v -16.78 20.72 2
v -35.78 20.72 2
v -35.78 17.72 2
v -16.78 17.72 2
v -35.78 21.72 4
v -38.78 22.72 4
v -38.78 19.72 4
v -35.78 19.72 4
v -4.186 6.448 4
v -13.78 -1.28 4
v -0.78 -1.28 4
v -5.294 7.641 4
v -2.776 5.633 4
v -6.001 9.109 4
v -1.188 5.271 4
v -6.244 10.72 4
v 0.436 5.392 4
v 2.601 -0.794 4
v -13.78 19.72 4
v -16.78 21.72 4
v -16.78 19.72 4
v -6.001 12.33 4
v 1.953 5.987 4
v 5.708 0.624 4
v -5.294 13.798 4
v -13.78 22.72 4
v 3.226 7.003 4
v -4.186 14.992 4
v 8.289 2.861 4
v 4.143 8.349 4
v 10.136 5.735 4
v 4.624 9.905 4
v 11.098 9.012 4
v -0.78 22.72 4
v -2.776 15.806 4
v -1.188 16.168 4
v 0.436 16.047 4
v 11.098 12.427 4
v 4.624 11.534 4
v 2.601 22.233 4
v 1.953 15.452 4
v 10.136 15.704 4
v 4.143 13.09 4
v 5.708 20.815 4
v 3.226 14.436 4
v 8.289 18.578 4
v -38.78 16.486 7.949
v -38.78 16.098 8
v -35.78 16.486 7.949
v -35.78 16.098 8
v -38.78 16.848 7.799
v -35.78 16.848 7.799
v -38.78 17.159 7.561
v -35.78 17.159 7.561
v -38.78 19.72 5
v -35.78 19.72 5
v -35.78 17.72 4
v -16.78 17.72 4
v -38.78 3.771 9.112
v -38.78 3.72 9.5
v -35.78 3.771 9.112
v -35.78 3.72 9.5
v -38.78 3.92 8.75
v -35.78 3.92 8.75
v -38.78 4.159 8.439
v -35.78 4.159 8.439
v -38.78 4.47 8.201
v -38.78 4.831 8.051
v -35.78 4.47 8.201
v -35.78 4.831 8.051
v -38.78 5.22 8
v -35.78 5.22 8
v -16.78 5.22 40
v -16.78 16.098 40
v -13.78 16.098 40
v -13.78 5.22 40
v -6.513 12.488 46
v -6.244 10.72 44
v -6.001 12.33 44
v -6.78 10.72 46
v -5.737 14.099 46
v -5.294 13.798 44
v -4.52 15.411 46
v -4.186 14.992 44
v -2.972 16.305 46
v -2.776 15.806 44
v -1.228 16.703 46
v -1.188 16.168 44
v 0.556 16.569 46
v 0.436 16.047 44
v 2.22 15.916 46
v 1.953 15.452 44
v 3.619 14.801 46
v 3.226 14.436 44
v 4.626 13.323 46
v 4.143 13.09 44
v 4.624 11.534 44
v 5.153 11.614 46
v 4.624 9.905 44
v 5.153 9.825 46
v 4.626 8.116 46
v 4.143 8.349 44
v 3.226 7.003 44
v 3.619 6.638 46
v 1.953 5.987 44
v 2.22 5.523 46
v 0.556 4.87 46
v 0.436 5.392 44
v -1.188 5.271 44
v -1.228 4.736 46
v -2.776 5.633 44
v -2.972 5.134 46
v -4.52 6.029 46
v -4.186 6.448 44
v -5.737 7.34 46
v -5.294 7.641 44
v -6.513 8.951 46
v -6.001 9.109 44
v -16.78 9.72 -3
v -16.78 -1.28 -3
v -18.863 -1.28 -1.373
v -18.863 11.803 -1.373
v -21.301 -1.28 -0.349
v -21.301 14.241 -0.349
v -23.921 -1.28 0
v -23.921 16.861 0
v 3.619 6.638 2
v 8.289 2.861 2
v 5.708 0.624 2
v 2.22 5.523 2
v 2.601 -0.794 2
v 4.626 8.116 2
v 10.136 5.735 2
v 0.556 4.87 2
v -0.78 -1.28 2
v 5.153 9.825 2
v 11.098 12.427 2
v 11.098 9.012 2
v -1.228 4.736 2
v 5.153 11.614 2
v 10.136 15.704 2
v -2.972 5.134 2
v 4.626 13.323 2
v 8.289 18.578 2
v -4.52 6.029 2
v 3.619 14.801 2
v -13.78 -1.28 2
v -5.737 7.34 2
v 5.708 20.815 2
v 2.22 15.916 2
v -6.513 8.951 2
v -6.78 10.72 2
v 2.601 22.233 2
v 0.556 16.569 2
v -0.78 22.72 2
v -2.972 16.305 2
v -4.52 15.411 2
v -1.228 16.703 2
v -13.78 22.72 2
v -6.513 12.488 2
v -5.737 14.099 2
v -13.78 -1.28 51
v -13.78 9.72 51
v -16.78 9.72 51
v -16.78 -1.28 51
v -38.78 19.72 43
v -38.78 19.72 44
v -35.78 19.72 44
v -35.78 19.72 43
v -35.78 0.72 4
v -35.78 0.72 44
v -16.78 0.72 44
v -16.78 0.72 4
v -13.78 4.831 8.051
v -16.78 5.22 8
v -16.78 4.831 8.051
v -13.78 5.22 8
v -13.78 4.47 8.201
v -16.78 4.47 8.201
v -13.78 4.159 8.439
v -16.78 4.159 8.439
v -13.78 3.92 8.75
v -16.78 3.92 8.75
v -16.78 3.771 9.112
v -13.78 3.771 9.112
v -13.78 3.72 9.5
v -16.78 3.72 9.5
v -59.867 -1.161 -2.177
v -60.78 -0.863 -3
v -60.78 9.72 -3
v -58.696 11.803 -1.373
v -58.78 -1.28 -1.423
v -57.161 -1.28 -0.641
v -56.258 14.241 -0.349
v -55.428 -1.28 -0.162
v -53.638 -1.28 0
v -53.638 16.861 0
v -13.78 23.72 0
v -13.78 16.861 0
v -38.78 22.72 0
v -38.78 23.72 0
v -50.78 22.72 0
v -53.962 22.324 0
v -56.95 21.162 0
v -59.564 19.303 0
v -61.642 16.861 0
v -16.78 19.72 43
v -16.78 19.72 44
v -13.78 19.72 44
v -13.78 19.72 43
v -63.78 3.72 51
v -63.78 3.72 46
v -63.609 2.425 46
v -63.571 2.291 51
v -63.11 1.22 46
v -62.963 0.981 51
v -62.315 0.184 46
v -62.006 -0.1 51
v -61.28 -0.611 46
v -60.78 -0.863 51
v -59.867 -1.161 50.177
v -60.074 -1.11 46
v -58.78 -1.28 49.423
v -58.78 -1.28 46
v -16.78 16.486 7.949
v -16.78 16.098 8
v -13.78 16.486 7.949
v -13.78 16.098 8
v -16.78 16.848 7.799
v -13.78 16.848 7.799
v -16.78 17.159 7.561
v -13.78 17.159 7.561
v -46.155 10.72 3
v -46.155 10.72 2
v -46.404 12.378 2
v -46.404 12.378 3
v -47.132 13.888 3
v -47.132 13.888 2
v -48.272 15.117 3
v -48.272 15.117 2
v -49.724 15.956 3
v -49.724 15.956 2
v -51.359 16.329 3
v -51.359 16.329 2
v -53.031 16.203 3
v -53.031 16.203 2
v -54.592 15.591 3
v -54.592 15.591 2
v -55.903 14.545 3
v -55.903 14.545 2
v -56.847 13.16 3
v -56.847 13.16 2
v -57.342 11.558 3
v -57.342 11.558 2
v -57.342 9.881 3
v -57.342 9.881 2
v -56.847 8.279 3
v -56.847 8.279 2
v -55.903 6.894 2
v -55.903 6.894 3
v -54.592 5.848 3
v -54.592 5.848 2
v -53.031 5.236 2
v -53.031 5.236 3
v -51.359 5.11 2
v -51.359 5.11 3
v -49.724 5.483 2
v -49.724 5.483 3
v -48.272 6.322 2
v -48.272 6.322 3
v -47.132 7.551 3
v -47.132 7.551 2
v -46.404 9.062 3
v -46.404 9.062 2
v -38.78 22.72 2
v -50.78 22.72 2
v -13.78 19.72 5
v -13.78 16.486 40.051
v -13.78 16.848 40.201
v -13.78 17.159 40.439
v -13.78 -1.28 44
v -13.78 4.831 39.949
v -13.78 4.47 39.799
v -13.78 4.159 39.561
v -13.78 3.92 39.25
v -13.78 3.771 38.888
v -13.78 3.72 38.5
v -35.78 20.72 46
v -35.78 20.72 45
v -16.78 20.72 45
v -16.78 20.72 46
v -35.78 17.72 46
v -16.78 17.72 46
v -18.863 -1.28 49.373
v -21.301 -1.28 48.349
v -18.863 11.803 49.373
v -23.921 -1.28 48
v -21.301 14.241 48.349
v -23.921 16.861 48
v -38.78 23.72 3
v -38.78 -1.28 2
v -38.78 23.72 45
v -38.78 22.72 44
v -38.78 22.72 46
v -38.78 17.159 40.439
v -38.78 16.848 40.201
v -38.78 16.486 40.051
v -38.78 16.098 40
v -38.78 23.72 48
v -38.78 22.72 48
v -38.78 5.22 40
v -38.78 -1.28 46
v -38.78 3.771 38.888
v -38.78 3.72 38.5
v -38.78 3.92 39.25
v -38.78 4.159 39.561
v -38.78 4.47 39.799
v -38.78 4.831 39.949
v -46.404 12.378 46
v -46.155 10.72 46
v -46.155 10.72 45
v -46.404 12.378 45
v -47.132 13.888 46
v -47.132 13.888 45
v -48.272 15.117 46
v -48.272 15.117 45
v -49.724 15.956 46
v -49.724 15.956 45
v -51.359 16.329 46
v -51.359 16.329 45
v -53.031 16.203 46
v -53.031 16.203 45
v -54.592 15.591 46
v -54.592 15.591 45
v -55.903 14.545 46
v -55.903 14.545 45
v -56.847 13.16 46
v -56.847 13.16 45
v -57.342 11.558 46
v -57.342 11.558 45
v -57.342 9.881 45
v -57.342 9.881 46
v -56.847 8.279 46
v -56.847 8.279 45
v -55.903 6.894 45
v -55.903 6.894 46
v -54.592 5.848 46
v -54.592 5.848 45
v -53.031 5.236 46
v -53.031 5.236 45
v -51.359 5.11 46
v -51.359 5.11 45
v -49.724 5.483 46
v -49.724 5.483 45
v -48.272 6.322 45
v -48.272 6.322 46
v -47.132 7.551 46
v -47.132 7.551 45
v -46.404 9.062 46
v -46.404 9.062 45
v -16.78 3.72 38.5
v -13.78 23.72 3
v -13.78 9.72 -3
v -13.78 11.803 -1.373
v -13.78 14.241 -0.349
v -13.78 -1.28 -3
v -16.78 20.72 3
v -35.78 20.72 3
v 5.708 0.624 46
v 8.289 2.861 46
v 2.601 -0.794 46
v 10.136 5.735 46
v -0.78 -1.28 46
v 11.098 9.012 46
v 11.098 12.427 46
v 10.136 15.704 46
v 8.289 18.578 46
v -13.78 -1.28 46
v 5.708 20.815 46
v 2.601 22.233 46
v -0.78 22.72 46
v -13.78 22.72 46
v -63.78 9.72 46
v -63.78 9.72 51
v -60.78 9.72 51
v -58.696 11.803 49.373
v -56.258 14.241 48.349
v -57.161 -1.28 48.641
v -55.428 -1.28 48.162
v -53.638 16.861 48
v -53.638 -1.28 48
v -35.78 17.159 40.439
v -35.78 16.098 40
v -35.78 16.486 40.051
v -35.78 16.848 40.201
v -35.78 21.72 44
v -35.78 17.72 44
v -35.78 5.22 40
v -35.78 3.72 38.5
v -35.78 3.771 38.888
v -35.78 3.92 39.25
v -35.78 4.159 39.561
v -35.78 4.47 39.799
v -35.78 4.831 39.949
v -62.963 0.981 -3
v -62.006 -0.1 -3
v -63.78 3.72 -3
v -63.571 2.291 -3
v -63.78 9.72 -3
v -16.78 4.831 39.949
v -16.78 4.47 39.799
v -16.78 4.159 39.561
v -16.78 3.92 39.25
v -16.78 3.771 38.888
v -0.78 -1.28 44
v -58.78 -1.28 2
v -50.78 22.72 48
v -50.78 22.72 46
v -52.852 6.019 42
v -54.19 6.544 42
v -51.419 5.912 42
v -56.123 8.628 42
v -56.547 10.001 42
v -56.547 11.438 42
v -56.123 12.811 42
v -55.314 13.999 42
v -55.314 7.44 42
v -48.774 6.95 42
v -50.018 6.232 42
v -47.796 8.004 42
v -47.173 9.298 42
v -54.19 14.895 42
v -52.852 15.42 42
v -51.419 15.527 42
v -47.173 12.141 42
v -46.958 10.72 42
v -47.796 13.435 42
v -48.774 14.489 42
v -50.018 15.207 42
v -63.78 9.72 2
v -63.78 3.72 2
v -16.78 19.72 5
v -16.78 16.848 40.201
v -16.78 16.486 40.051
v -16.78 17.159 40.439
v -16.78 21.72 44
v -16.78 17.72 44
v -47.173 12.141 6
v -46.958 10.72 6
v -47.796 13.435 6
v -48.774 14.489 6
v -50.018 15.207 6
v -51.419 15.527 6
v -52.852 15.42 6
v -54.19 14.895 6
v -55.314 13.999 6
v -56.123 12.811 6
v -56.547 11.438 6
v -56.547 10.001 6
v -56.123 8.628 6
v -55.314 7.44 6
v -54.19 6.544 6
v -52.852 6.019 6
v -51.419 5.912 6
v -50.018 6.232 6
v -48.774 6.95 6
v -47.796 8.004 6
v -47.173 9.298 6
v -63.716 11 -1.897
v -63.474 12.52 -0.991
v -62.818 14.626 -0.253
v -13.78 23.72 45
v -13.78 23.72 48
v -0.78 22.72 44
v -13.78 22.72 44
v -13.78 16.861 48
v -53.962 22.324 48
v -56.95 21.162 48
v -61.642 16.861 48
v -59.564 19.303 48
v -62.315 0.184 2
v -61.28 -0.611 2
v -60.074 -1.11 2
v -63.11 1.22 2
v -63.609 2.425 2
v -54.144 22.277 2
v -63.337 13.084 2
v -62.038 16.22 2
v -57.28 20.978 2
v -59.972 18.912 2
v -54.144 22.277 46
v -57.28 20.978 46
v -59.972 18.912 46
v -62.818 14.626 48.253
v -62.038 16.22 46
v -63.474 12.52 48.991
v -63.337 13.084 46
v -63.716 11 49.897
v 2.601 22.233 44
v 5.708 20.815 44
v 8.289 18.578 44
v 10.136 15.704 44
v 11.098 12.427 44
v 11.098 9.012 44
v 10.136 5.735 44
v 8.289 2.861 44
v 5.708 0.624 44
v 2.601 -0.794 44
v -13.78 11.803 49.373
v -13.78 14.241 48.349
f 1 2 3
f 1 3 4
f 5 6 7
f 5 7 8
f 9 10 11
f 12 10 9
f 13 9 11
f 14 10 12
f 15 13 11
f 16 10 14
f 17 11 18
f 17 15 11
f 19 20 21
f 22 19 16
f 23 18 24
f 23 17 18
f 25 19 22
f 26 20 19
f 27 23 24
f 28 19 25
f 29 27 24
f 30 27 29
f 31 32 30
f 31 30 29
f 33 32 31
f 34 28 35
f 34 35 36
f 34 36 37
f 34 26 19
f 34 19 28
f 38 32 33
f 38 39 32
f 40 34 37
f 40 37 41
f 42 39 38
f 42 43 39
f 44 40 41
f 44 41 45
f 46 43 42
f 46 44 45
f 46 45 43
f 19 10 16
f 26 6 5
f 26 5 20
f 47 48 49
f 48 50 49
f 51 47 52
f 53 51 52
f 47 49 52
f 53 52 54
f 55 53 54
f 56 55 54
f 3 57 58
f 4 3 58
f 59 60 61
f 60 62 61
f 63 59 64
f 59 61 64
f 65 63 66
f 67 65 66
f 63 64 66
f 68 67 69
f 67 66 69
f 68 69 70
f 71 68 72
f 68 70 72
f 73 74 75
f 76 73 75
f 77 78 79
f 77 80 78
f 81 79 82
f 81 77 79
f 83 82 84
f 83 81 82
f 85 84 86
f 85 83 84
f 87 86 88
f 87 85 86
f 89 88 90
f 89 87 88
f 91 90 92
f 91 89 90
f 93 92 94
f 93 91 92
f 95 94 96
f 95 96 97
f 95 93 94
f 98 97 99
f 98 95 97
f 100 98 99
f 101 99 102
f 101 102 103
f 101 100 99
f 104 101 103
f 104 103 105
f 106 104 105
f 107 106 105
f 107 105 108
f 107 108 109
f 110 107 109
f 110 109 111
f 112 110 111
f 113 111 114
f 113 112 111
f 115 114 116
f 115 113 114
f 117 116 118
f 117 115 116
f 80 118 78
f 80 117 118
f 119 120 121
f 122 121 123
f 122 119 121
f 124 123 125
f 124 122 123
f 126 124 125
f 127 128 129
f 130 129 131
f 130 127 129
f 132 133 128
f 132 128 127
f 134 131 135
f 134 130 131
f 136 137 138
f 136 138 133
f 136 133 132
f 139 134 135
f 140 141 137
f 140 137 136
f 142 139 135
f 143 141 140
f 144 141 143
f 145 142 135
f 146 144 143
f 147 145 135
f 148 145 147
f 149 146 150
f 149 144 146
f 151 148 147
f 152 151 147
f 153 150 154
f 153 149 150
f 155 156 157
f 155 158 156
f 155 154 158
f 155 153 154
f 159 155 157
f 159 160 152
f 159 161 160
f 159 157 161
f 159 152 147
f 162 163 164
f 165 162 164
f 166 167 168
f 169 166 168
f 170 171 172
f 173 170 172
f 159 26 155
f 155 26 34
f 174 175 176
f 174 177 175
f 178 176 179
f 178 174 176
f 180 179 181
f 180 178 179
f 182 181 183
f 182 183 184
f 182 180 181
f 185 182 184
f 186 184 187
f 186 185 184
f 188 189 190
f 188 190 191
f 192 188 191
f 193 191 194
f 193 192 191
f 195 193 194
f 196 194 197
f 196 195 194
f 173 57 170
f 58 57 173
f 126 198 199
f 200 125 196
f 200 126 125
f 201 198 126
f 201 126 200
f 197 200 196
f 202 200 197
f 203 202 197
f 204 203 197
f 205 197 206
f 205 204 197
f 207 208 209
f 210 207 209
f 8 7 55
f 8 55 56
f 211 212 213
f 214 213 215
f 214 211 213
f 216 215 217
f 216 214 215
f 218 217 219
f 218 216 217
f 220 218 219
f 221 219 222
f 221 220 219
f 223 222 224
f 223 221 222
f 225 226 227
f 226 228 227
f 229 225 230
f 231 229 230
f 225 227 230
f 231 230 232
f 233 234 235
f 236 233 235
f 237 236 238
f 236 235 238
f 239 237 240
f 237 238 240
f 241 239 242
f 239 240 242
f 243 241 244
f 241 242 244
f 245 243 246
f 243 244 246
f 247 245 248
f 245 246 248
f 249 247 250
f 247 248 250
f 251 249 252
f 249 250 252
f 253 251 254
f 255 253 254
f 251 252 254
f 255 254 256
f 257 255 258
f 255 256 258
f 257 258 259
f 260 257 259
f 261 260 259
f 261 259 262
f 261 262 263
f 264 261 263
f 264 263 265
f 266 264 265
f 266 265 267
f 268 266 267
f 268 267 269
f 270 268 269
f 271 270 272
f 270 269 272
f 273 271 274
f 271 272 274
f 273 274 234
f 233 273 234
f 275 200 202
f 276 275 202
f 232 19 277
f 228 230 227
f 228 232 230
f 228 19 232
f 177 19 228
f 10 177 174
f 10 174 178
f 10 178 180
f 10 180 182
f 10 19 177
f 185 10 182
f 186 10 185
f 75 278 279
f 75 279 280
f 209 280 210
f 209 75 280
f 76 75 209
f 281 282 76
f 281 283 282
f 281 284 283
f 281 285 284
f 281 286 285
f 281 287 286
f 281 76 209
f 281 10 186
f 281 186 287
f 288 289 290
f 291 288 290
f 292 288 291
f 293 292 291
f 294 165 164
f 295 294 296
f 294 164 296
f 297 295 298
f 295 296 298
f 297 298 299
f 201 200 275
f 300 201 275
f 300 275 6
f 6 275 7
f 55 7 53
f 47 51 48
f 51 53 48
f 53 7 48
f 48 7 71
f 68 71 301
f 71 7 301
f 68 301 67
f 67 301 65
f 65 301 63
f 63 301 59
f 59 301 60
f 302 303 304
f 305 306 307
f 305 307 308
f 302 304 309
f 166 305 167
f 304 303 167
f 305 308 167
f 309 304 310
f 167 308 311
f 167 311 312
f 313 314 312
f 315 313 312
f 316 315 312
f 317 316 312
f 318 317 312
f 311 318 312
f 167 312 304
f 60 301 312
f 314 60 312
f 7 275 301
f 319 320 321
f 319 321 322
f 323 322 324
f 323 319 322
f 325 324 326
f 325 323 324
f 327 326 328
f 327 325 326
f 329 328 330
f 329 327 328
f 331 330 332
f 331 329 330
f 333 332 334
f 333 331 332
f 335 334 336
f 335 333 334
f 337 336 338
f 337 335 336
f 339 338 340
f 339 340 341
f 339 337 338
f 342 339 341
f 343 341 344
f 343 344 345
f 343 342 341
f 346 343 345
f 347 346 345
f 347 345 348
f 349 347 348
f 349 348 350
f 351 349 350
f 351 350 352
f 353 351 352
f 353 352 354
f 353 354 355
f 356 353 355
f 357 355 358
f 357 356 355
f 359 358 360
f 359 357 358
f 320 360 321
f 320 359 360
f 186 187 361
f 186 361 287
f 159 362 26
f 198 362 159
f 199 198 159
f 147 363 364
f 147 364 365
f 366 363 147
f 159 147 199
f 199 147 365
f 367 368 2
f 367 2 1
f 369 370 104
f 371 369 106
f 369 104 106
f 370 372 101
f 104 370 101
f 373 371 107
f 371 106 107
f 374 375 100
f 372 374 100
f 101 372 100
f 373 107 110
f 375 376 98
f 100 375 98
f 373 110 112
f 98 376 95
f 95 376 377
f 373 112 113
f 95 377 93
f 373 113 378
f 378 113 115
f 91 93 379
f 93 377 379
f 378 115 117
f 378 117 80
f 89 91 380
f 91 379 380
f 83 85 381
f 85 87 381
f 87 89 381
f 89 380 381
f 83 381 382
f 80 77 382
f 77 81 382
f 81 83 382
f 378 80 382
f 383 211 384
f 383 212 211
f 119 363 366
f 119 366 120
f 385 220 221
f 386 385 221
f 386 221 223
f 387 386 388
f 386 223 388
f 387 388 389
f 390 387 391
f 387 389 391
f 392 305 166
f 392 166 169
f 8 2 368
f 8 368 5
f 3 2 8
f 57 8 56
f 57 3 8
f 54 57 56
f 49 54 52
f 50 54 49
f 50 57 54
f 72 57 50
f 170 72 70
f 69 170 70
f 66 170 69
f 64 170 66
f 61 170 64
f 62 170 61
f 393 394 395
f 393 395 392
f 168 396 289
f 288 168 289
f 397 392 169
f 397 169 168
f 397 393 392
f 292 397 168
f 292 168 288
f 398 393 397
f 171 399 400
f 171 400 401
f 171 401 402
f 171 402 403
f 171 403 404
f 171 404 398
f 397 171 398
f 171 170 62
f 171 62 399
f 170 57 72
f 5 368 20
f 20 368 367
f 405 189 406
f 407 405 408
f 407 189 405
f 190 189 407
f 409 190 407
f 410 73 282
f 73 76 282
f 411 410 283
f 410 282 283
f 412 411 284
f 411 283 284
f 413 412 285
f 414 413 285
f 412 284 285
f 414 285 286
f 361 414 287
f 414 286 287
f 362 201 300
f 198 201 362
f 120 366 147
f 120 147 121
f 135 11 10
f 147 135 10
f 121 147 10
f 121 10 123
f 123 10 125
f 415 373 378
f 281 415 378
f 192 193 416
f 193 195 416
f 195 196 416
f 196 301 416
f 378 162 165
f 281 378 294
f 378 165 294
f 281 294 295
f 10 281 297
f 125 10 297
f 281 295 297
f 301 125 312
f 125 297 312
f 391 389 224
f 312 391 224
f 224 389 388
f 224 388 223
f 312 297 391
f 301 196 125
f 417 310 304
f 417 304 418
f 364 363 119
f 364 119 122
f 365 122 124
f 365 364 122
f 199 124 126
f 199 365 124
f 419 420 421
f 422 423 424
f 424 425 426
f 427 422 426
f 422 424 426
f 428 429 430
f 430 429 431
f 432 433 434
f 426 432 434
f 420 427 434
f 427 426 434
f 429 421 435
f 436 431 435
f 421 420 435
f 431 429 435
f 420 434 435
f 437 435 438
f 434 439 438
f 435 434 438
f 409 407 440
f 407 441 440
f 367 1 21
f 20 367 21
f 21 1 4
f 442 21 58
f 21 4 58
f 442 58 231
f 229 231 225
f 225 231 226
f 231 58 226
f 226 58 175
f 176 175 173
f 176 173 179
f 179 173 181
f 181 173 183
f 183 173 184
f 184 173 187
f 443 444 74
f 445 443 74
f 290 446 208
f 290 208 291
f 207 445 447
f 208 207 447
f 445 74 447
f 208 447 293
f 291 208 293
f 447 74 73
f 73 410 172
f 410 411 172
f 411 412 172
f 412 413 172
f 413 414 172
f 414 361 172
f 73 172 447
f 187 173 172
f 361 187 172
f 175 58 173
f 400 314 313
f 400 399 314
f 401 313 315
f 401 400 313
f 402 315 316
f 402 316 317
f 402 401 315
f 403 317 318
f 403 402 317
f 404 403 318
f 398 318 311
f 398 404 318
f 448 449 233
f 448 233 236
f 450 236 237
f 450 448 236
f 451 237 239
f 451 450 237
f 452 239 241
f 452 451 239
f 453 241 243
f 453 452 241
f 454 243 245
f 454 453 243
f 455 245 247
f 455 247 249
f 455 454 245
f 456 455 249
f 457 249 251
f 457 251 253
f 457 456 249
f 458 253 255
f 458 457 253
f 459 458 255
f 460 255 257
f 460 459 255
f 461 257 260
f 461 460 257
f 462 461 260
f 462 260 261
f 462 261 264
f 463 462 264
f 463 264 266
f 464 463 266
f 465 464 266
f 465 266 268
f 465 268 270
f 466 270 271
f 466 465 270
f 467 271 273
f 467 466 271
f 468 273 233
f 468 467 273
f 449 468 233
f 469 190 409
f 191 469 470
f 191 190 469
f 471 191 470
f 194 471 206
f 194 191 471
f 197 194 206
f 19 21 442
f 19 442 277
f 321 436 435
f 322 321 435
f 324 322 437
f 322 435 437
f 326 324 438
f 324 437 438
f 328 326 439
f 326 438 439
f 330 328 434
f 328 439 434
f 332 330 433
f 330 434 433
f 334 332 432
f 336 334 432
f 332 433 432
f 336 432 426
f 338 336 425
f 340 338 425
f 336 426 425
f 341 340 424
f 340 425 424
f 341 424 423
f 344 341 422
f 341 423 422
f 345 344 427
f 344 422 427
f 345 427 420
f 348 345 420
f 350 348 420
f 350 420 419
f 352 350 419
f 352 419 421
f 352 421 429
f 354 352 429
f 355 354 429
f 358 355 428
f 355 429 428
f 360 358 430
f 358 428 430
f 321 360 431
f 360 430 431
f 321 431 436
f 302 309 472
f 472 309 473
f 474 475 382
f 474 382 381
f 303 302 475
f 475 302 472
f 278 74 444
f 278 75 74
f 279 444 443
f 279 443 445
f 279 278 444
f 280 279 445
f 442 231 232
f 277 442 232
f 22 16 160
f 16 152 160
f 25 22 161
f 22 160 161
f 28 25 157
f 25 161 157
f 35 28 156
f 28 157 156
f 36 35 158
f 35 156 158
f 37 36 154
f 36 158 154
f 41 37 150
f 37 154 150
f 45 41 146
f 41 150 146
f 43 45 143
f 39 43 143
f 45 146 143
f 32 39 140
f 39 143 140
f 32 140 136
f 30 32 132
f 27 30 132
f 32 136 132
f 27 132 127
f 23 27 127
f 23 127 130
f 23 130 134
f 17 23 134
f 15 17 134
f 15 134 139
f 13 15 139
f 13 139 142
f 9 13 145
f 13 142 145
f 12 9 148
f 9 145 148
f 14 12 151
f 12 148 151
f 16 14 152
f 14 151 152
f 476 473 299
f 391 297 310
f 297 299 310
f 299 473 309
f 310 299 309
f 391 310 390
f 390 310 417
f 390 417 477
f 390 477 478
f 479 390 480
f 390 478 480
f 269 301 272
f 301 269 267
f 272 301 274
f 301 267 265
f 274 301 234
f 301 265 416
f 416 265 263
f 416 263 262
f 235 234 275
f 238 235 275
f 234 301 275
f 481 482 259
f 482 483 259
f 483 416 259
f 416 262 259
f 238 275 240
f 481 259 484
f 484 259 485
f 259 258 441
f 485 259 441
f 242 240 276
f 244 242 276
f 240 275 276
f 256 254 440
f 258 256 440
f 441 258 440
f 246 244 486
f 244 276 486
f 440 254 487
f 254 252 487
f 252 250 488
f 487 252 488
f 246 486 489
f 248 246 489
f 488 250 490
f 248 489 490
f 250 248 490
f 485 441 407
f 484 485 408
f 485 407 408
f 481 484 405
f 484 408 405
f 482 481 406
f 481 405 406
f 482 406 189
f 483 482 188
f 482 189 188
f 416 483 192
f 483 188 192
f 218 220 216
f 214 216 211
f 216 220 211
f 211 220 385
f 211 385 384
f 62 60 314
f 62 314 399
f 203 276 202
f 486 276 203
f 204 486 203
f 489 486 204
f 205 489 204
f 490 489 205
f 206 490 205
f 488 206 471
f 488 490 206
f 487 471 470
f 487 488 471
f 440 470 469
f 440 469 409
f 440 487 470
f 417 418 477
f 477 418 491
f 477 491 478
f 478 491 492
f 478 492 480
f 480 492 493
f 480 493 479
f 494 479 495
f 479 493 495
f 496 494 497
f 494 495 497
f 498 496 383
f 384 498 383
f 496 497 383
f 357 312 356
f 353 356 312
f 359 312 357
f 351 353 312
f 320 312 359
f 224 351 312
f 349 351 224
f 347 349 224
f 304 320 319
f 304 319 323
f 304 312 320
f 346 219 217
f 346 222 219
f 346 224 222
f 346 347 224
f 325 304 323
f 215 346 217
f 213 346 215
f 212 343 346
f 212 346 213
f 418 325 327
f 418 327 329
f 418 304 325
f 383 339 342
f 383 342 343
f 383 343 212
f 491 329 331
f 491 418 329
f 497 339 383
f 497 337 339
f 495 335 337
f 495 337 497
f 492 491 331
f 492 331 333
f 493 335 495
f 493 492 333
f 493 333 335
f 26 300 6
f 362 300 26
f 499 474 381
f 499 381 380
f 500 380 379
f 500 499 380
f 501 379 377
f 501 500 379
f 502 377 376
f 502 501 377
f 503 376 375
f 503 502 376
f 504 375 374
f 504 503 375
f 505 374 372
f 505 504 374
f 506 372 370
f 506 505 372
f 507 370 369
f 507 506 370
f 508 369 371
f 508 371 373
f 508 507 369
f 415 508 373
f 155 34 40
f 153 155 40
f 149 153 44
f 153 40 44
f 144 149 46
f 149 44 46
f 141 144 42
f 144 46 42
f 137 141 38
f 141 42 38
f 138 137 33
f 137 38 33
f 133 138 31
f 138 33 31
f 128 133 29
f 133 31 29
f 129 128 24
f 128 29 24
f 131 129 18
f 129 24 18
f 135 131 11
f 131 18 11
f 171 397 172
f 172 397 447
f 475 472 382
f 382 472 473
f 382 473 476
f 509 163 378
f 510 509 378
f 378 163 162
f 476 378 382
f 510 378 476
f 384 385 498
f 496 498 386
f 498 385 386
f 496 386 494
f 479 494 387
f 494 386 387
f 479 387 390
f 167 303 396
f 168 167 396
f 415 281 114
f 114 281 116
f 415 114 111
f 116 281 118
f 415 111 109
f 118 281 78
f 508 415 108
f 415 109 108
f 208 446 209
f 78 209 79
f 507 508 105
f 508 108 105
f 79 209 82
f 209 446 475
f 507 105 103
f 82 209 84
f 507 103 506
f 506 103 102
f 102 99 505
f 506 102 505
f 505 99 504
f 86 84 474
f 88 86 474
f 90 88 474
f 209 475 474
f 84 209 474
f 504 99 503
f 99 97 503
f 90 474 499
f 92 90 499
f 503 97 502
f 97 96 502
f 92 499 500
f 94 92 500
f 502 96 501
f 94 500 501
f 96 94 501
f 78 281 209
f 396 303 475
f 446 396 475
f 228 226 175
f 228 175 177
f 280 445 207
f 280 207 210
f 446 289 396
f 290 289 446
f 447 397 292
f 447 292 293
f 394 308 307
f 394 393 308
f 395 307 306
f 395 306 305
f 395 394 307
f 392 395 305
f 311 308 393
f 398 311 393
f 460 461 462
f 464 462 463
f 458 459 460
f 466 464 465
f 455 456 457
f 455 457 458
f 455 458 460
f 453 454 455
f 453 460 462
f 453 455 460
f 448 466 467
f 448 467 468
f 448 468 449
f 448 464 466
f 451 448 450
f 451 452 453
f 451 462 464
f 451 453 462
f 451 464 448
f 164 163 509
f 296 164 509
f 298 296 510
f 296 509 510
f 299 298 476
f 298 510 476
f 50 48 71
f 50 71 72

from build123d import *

# Parameters (mm, degrees)
SKETCH_1_W             = 25
SKETCH_1_H             = 25
EXTRUDE_1_DEPTH        = 4
SKETCH_2_W             = 25
SKETCH_2_H             = 24
EXTRUDE_2_DEPTH        = 2
SKETCH_3_R             = 5.625
EXTRUDE_3_DEPTH        = 4
CHAMFER_1_SIZE         = 3
CHAMFER_1_SIZE2        = 0.803847577
EXTRUDE_4_DEPTH        = 2
SKETCH_6_R             = 5
CUT_EXTRUDE_2_DEPTH    = 10
EXTRUDE_6_DEPTH        = 20
SKETCH_9_W             = 19
SKETCH_9_H             = 3
CUT_EXTRUDE_4_DEPTH    = 2
CHAMFER_2_SIZE         = 1
CHAMFER_3_SIZE         = 3.732050808
CHAMFER_3_SIZE_2       = 1
FILLET_1_R             = 13
CHAMFER_4_SIZE         = 1
SKETCH_11_W            = 3
SKETCH_11_H            = 4
EXTRUDE_7_DEPTH        = 16
PATTERN_LINEAR_1_COUNT = 2
PATTERN_LINEAR_1_PITCH = 22
CHAMFER_6_SIZE         = 3
FILLET_2_R             = 1.5
SKETCH1_W              = 3
SKETCH1_H              = 11
BOSS_EXTRUDE1_DEPTH    = 3
FILLET1_R              = 10
SKETCH2_W              = 3
SKETCH2_H              = 11
BOSS_EXTRUDE2_DEPTH    = 3
FILLET2_R              = 10
FILLET3_R              = 5


with BuildPart() as part:
    # Эскиз1 → Бобышка-Вытянуть1 (new body)
    with BuildSketch(Plane.XY):
        with Locations((-26.279531703, 11.219512195)):
            Rectangle(SKETCH_1_W, SKETCH_1_H)
    extrude(amount=EXTRUDE_1_DEPTH)

    # Эскиз2 → Бобышка-Вытянуть2 (add)
    with BuildSketch(Plane(origin=(0, 0, 0), x_dir=(-1, 0, 0), z_dir=(0, 0, -1))):
        with Locations((51.279531703, 10.719512195)):
            Rectangle(SKETCH_2_W, SKETCH_2_H)
    extrude(amount=-EXTRUDE_2_DEPTH)

    # Эскиз3 → Бобышка-Вытянуть3 (add)
    with BuildSketch(Plane.XY.offset(2)):
        with Locations((-51.779531703, 10.719512195)):
            Circle(SKETCH_3_R)
    extrude(amount=EXTRUDE_3_DEPTH)

    # Фаска1
    chamfer_1_edges = [part.edges().sort_by_distance(p)[0] for p in [
        (-57.404531703, 10.719512195, 6),
    ]]
    chamfer_1_side = [part.faces().sort_by_distance(p)[0] for p in [
        (-57.404531703, 10.719512195, 4),
    ]]
    chamfer(chamfer_1_edges, length=CHAMFER_1_SIZE, length2=CHAMFER_1_SIZE2, reference=chamfer_1_side[0])

    # Эскиз5 → Бобышка-Вытянуть4 (add)
    with BuildSketch(Plane.XY.offset(4)):
        with BuildLine():
            Line((-18.981970926, 22.719512195), (-0.779531703, 22.719512195))
            ThreePointArc((-0.779531703, 22.719512195), (11.220468297, 10.719512195), (-0.779531703, -1.280487805))
            Line((-0.779531703, -1.280487805), (-18.981970926, -1.280487805))
            ThreePointArc((-18.981970926, -1.280487805), (-30.981970926, 10.719512195), (-18.981970926, 22.719512195))
        make_face()
    extrude(amount=-EXTRUDE_4_DEPTH)

    # Эскиз6 → Вырез-Вытянуть2 (cut)
    with BuildSketch(Plane(origin=(0, 0, 2), x_dir=(-1, 0, 0), z_dir=(0, 0, -1))):
        with Locations((0.779531703, 10.719512195)):
            Circle(SKETCH_6_R)
    extrude(amount=-CUT_EXTRUDE_2_DEPTH, mode=Mode.SUBTRACT)

    # Эскиз8 → Бобышка-Вытянуть6 (add)
    with BuildSketch(Plane.XY.offset(4)):
        Polygon((-38.779531703, 3.719512195), (-35.779531703, 3.719512195), (-35.779531703, 0.719512195), (-16.779531703, 0.719512195), (-16.779531703, 3.719512195), (-13.779531703, 3.719512195), (-13.779531703, -1.280487805), (-38.779531703, -1.280487805), align=None)
    extrude(amount=EXTRUDE_6_DEPTH)

    # Эскиз9 → Вырез-Вытянуть4 (cut)
    with BuildSketch(Plane.XY.offset(4)):
        with Locations((-26.279531703, 19.219512195)):
            Rectangle(SKETCH_9_W, SKETCH_9_H)
    extrude(amount=-CUT_EXTRUDE_4_DEPTH, mode=Mode.SUBTRACT)

    # Фаска2
    chamfer_2_edges = [part.edges().sort_by_distance(p)[0] for p in [
        (-26.279531703, 20.719512195, 4),
    ]]
    chamfer(chamfer_2_edges, length=CHAMFER_2_SIZE)

    # Фаска3
    # the kernel refuses this chamfer: 3.732050808, 1 mm, written as the material it takes off along each edge
    with BuildSketch(Plane(origin=(-0.779531703, 10.719512195, 2), x_dir=(-1, 0, 0), z_dir=(0, -1, 0))) as chamfer_3_piece_1:
        Polygon((5, -CHAMFER_3_SIZE), (5 + CHAMFER_3_SIZE_2, 0), (5, 0), align=None)
    revolve(axis=Axis((-0.779531703, 10.719512195, 2), (0, 0, -1)), mode=Mode.SUBTRACT)

    # Скругление1
    fillet_1_edges = [part.edges().sort_by_distance(p)[0] for p in [
        (-63.779531703, 22.719512195, 1),
    ]]
    fillet(fillet_1_edges, radius=FILLET_1_R)

    # Фаска4
    chamfer_4_edges = [part.edges().sort_by_distance(p)[0] for p in [
        (-26.279531703, 23.719512195, 4),
    ]]
    chamfer(chamfer_4_edges, length=CHAMFER_4_SIZE)

    # Эскиз11 → Бобышка-Вытянуть7 (add)
    with BuildSketch(Plane(origin=(0, 3.719512195, 0), x_dir=(1, 0, 0), z_dir=(0, 1, 0))):
        with Locations((-37.279531703, -6)):
            Rectangle(SKETCH_11_W, SKETCH_11_H)
    extrude_7 = extrude(amount=EXTRUDE_7_DEPTH)

    # Линейный массив1: Бобышка-Вытянуть7 ×2
    with Locations(*[(i * PATTERN_LINEAR_1_PITCH, 0, 0) for i in range(1, PATTERN_LINEAR_1_COUNT)]):
        add(extrude_7)

    # Фаска6
    chamfer_6_edges = [part.edges().sort_by_distance(p)[0] for p in [
        (-37.279531703, 19.719512195, 8),
        (-15.279531703, 19.719512195, 8),
    ]]
    chamfer(chamfer_6_edges, length=CHAMFER_6_SIZE)

    # Скругление2
    fillet_2_edges = [part.edges().sort_by_distance(p)[0] for p in [
        (-37.279531703, 3.719512195, 8),
        (-15.279531703, 3.719512195, 8),
        (-15.279531703, 16.719512195, 8),
        (-37.279531703, 16.719512195, 8),
    ]]
    fillet(fillet_2_edges, radius=FILLET_2_R)

    # Sketch1 → Boss-Extrude1 (add)
    with BuildSketch(Plane(origin=(0, 0, 0), x_dir=(-1, 0, 0), z_dir=(0, 0, -1))):
        with Locations((15.279531703, 4.219512195)):
            Rectangle(SKETCH1_W, SKETCH1_H)
    extrude(amount=BOSS_EXTRUDE1_DEPTH)

    # Fillet1
    # the kernel refuses this fillet: 10 mm, written as the material it adds along each edge
    with BuildSketch(Plane(origin=(-16.779531703, 9.719512195, 0), x_dir=(-1, 0, 0), z_dir=(0, -1, 0))) as fillet1_piece_1:
        with BuildLine():
            CenterArc((7.141428429, 10), FILLET1_R, 224.427004001, 45.572995999)
            Line((0, 3), (-0.142828569, 2.86))
            ThreePointArc((-0.142828569, 2.86), (-0.2, 1.5), (-0.2, 0))
            Line((-0.2, 0), (0, -0.2))
            Line((0, -0.2), (7.141428429, -0.2))
            Line((7.141428429, -0.2), (7.141428429, 0))
        make_face()
    extrude(amount=11)
    with BuildSketch(Plane(origin=(-13.779531703, 9.719512195, 0), x_dir=(0, 1, 0), z_dir=(-1, 0, 0))) as fillet1_piece_2:
        with BuildLine():
            CenterArc((7.141428429, 10), FILLET1_R, 224.427004001, 45.572995999)
            Line((0, 3), (-0.142828569, 2.86))
            ThreePointArc((-0.142828569, 2.86), (-0.2, 1.5), (-0.2, 0))
            Line((-0.2, 0), (0, -0.2))
            Line((0, -0.2), (7.141428429, -0.2))
            Line((7.141428429, -0.2), (7.141428429, 0))
        make_face()
    extrude(amount=3)
    with BuildSketch(Plane(origin=(-16.779531703, 27.573083266, 0), x_dir=(-1, 0, 0), z_dir=(0, -1, 0))) as fillet1_piece_3a_section:
        with BuildLine():
            CenterArc((7.141428429, 10), FILLET1_R, 224.427004001, 45.572995999)
            Line((0, 3), (-0.142828569, 2.86))
            ThreePointArc((-0.142828569, 2.86), (-0.2, 1.5), (-0.2, 0))
            Line((-0.2, 0), (0, -0.2))
            Line((0, -0.2), (7.141428429, -0.2))
            Line((7.141428429, -0.2), (7.141428429, 0))
        make_face()
    fillet1_piece_3a = extrude(amount=28.853571071, mode=Mode.PRIVATE)
    fillet1_piece_3a = split(fillet1_piece_3a, bisect_by=Plane(origin=(-16.779531703, 23.719512195, 0), z_dir=(0, -1, 0)), keep=Keep.TOP, mode=Mode.PRIVATE)
    fillet1_piece_3a = split(fillet1_piece_3a, bisect_by=Plane(origin=(-16.779531703, 9.719512195, 0), z_dir=(0, 1, 0)), keep=Keep.TOP, mode=Mode.PRIVATE)
    with BuildSketch(Plane(origin=(-13.779531703, 9.719512195, 0), x_dir=(0, 1, 0), z_dir=(-1, 0, 0))) as fillet1_piece_3b_section:
        with BuildLine():
            CenterArc((7.141428429, 10), FILLET1_R, 224.427004001, 45.572995999)
            Line((0, 3), (-0.142828569, 2.86))
            ThreePointArc((-0.142828569, 2.86), (-0.2, 1.5), (-0.2, 0))
            Line((-0.2, 0), (0, -0.2))
            Line((0, -0.2), (7.141428429, -0.2))
            Line((7.141428429, -0.2), (7.141428429, 0))
        make_face()
    fillet1_piece_3b = extrude(amount=20.853571071, mode=Mode.PRIVATE)
    fillet1_piece_3b = split(fillet1_piece_3b, bisect_by=Plane(origin=(-16.779531703, 9.719512195, 0), z_dir=(-1, 0, 0)), keep=Keep.TOP, mode=Mode.PRIVATE)
    fillet1_piece_3 = fillet1_piece_3a & fillet1_piece_3b
    add(fillet1_piece_3)

    # Sketch2 → Boss-Extrude2 (add)
    with BuildSketch(Plane(origin=(0, 0, 0), x_dir=(-1, 0, 0), z_dir=(0, 0, -1))):
        with Locations((62.279531703, 4.219512195)):
            Rectangle(SKETCH2_W, SKETCH2_H)
    extrude(amount=BOSS_EXTRUDE2_DEPTH)

    # Fillet2
    # the kernel refuses this fillet: 10 mm, written as the material it adds along each edge
    with BuildSketch(Plane(origin=(-60.779531703, 9.719512195, 0), x_dir=(0, 1, 0), z_dir=(-1, 0, 0))) as fillet2_piece_1_section:
        with BuildLine():
            CenterArc((7.141428429, 10), FILLET2_R, 224.427004001, 45.572995999)
            Line((0, 3), (0, 0))
            Line((0, 0), (7.141428429, 0))
        make_face()
    fillet2_piece_1 = extrude(amount=20.853571071, mode=Mode.PRIVATE)
    fillet2_piece_1 = fillet2_piece_1 & Plane(origin=(-50.779531703, 9.719512195, 0), x_dir=(0, 1, 0), z_dir=(0, 0, 1)) * Cylinder(13, 71, mode=Mode.PRIVATE)
    add(fillet2_piece_1)
    with BuildSketch(Plane(origin=(-60.779531703, -1.280487805, 0), x_dir=(1, 0, 0), z_dir=(0, 1, 0))) as fillet2_piece_2:
        with BuildLine():
            CenterArc((7.141428429, 10), FILLET2_R, 224.427004001, 45.572995999)
            Line((0, 3), (0, 0))
            Line((0, 0), (7.141428429, 0))
        make_face()
    extrude(amount=11)
    with BuildSketch(Plane(origin=(-42.925960632, 9.719512195, 0), x_dir=(0, 1, 0), z_dir=(-1, 0, 0))) as fillet2_piece_3a_section:
        with BuildLine():
            CenterArc((7.141428429, 10), FILLET2_R, 224.427004001, 45.572995999)
            Line((0, 3), (0, 0))
            Line((0, 0), (7.141428429, 0))
        make_face()
    fillet2_piece_3a = extrude(amount=20.853571071, mode=Mode.PRIVATE)
    fillet2_piece_3a = split(fillet2_piece_3a, bisect_by=Plane(origin=(-60.779531703, 9.719512195, 0), z_dir=(1, 0, 0)), keep=Keep.TOP, mode=Mode.PRIVATE)
    with BuildSketch(Plane(origin=(-60.779531703, -1.280487805, 0), x_dir=(1, 0, 0), z_dir=(0, 1, 0))) as fillet2_piece_3b_section:
        with BuildLine():
            CenterArc((7.141428429, 10), FILLET2_R, 224.427004001, 45.572995999)
            Line((0, 3), (0, 0))
            Line((0, 0), (7.141428429, 0))
        make_face()
    fillet2_piece_3b = extrude(amount=28.853571071, mode=Mode.PRIVATE)
    fillet2_piece_3b = fillet2_piece_3b & Plane(origin=(-50.779531703, 9.719512195, 0), x_dir=(0, 1, 0), z_dir=(0, 0, 1)) * Cylinder(13, 87, mode=Mode.PRIVATE)
    fillet2_piece_3b = split(fillet2_piece_3b, bisect_by=Plane(origin=(-60.779531703, 9.719512195, 0), z_dir=(0, 1, 0)), keep=Keep.TOP, mode=Mode.PRIVATE)
    fillet2_piece_3 = fillet2_piece_3a & fillet2_piece_3b
    add(fillet2_piece_3)

    # Fillet3
    fillet3_edges = [part.edges().sort_by_distance(p)[0] for p in [
        (-63.779531703, -1.280487805, -0.5),
    ]]
    fillet(fillet3_edges, radius=FILLET3_R)

    # Зеркальное отражение1: part across plane


with BuildPart() as part_1:
    add(part.part)
    add(part.part.mirror(Plane(origin=(0, 0, 24), x_dir=(1, 0, 0), z_dir=(0, 0, -1))))


solid = part_1.part
